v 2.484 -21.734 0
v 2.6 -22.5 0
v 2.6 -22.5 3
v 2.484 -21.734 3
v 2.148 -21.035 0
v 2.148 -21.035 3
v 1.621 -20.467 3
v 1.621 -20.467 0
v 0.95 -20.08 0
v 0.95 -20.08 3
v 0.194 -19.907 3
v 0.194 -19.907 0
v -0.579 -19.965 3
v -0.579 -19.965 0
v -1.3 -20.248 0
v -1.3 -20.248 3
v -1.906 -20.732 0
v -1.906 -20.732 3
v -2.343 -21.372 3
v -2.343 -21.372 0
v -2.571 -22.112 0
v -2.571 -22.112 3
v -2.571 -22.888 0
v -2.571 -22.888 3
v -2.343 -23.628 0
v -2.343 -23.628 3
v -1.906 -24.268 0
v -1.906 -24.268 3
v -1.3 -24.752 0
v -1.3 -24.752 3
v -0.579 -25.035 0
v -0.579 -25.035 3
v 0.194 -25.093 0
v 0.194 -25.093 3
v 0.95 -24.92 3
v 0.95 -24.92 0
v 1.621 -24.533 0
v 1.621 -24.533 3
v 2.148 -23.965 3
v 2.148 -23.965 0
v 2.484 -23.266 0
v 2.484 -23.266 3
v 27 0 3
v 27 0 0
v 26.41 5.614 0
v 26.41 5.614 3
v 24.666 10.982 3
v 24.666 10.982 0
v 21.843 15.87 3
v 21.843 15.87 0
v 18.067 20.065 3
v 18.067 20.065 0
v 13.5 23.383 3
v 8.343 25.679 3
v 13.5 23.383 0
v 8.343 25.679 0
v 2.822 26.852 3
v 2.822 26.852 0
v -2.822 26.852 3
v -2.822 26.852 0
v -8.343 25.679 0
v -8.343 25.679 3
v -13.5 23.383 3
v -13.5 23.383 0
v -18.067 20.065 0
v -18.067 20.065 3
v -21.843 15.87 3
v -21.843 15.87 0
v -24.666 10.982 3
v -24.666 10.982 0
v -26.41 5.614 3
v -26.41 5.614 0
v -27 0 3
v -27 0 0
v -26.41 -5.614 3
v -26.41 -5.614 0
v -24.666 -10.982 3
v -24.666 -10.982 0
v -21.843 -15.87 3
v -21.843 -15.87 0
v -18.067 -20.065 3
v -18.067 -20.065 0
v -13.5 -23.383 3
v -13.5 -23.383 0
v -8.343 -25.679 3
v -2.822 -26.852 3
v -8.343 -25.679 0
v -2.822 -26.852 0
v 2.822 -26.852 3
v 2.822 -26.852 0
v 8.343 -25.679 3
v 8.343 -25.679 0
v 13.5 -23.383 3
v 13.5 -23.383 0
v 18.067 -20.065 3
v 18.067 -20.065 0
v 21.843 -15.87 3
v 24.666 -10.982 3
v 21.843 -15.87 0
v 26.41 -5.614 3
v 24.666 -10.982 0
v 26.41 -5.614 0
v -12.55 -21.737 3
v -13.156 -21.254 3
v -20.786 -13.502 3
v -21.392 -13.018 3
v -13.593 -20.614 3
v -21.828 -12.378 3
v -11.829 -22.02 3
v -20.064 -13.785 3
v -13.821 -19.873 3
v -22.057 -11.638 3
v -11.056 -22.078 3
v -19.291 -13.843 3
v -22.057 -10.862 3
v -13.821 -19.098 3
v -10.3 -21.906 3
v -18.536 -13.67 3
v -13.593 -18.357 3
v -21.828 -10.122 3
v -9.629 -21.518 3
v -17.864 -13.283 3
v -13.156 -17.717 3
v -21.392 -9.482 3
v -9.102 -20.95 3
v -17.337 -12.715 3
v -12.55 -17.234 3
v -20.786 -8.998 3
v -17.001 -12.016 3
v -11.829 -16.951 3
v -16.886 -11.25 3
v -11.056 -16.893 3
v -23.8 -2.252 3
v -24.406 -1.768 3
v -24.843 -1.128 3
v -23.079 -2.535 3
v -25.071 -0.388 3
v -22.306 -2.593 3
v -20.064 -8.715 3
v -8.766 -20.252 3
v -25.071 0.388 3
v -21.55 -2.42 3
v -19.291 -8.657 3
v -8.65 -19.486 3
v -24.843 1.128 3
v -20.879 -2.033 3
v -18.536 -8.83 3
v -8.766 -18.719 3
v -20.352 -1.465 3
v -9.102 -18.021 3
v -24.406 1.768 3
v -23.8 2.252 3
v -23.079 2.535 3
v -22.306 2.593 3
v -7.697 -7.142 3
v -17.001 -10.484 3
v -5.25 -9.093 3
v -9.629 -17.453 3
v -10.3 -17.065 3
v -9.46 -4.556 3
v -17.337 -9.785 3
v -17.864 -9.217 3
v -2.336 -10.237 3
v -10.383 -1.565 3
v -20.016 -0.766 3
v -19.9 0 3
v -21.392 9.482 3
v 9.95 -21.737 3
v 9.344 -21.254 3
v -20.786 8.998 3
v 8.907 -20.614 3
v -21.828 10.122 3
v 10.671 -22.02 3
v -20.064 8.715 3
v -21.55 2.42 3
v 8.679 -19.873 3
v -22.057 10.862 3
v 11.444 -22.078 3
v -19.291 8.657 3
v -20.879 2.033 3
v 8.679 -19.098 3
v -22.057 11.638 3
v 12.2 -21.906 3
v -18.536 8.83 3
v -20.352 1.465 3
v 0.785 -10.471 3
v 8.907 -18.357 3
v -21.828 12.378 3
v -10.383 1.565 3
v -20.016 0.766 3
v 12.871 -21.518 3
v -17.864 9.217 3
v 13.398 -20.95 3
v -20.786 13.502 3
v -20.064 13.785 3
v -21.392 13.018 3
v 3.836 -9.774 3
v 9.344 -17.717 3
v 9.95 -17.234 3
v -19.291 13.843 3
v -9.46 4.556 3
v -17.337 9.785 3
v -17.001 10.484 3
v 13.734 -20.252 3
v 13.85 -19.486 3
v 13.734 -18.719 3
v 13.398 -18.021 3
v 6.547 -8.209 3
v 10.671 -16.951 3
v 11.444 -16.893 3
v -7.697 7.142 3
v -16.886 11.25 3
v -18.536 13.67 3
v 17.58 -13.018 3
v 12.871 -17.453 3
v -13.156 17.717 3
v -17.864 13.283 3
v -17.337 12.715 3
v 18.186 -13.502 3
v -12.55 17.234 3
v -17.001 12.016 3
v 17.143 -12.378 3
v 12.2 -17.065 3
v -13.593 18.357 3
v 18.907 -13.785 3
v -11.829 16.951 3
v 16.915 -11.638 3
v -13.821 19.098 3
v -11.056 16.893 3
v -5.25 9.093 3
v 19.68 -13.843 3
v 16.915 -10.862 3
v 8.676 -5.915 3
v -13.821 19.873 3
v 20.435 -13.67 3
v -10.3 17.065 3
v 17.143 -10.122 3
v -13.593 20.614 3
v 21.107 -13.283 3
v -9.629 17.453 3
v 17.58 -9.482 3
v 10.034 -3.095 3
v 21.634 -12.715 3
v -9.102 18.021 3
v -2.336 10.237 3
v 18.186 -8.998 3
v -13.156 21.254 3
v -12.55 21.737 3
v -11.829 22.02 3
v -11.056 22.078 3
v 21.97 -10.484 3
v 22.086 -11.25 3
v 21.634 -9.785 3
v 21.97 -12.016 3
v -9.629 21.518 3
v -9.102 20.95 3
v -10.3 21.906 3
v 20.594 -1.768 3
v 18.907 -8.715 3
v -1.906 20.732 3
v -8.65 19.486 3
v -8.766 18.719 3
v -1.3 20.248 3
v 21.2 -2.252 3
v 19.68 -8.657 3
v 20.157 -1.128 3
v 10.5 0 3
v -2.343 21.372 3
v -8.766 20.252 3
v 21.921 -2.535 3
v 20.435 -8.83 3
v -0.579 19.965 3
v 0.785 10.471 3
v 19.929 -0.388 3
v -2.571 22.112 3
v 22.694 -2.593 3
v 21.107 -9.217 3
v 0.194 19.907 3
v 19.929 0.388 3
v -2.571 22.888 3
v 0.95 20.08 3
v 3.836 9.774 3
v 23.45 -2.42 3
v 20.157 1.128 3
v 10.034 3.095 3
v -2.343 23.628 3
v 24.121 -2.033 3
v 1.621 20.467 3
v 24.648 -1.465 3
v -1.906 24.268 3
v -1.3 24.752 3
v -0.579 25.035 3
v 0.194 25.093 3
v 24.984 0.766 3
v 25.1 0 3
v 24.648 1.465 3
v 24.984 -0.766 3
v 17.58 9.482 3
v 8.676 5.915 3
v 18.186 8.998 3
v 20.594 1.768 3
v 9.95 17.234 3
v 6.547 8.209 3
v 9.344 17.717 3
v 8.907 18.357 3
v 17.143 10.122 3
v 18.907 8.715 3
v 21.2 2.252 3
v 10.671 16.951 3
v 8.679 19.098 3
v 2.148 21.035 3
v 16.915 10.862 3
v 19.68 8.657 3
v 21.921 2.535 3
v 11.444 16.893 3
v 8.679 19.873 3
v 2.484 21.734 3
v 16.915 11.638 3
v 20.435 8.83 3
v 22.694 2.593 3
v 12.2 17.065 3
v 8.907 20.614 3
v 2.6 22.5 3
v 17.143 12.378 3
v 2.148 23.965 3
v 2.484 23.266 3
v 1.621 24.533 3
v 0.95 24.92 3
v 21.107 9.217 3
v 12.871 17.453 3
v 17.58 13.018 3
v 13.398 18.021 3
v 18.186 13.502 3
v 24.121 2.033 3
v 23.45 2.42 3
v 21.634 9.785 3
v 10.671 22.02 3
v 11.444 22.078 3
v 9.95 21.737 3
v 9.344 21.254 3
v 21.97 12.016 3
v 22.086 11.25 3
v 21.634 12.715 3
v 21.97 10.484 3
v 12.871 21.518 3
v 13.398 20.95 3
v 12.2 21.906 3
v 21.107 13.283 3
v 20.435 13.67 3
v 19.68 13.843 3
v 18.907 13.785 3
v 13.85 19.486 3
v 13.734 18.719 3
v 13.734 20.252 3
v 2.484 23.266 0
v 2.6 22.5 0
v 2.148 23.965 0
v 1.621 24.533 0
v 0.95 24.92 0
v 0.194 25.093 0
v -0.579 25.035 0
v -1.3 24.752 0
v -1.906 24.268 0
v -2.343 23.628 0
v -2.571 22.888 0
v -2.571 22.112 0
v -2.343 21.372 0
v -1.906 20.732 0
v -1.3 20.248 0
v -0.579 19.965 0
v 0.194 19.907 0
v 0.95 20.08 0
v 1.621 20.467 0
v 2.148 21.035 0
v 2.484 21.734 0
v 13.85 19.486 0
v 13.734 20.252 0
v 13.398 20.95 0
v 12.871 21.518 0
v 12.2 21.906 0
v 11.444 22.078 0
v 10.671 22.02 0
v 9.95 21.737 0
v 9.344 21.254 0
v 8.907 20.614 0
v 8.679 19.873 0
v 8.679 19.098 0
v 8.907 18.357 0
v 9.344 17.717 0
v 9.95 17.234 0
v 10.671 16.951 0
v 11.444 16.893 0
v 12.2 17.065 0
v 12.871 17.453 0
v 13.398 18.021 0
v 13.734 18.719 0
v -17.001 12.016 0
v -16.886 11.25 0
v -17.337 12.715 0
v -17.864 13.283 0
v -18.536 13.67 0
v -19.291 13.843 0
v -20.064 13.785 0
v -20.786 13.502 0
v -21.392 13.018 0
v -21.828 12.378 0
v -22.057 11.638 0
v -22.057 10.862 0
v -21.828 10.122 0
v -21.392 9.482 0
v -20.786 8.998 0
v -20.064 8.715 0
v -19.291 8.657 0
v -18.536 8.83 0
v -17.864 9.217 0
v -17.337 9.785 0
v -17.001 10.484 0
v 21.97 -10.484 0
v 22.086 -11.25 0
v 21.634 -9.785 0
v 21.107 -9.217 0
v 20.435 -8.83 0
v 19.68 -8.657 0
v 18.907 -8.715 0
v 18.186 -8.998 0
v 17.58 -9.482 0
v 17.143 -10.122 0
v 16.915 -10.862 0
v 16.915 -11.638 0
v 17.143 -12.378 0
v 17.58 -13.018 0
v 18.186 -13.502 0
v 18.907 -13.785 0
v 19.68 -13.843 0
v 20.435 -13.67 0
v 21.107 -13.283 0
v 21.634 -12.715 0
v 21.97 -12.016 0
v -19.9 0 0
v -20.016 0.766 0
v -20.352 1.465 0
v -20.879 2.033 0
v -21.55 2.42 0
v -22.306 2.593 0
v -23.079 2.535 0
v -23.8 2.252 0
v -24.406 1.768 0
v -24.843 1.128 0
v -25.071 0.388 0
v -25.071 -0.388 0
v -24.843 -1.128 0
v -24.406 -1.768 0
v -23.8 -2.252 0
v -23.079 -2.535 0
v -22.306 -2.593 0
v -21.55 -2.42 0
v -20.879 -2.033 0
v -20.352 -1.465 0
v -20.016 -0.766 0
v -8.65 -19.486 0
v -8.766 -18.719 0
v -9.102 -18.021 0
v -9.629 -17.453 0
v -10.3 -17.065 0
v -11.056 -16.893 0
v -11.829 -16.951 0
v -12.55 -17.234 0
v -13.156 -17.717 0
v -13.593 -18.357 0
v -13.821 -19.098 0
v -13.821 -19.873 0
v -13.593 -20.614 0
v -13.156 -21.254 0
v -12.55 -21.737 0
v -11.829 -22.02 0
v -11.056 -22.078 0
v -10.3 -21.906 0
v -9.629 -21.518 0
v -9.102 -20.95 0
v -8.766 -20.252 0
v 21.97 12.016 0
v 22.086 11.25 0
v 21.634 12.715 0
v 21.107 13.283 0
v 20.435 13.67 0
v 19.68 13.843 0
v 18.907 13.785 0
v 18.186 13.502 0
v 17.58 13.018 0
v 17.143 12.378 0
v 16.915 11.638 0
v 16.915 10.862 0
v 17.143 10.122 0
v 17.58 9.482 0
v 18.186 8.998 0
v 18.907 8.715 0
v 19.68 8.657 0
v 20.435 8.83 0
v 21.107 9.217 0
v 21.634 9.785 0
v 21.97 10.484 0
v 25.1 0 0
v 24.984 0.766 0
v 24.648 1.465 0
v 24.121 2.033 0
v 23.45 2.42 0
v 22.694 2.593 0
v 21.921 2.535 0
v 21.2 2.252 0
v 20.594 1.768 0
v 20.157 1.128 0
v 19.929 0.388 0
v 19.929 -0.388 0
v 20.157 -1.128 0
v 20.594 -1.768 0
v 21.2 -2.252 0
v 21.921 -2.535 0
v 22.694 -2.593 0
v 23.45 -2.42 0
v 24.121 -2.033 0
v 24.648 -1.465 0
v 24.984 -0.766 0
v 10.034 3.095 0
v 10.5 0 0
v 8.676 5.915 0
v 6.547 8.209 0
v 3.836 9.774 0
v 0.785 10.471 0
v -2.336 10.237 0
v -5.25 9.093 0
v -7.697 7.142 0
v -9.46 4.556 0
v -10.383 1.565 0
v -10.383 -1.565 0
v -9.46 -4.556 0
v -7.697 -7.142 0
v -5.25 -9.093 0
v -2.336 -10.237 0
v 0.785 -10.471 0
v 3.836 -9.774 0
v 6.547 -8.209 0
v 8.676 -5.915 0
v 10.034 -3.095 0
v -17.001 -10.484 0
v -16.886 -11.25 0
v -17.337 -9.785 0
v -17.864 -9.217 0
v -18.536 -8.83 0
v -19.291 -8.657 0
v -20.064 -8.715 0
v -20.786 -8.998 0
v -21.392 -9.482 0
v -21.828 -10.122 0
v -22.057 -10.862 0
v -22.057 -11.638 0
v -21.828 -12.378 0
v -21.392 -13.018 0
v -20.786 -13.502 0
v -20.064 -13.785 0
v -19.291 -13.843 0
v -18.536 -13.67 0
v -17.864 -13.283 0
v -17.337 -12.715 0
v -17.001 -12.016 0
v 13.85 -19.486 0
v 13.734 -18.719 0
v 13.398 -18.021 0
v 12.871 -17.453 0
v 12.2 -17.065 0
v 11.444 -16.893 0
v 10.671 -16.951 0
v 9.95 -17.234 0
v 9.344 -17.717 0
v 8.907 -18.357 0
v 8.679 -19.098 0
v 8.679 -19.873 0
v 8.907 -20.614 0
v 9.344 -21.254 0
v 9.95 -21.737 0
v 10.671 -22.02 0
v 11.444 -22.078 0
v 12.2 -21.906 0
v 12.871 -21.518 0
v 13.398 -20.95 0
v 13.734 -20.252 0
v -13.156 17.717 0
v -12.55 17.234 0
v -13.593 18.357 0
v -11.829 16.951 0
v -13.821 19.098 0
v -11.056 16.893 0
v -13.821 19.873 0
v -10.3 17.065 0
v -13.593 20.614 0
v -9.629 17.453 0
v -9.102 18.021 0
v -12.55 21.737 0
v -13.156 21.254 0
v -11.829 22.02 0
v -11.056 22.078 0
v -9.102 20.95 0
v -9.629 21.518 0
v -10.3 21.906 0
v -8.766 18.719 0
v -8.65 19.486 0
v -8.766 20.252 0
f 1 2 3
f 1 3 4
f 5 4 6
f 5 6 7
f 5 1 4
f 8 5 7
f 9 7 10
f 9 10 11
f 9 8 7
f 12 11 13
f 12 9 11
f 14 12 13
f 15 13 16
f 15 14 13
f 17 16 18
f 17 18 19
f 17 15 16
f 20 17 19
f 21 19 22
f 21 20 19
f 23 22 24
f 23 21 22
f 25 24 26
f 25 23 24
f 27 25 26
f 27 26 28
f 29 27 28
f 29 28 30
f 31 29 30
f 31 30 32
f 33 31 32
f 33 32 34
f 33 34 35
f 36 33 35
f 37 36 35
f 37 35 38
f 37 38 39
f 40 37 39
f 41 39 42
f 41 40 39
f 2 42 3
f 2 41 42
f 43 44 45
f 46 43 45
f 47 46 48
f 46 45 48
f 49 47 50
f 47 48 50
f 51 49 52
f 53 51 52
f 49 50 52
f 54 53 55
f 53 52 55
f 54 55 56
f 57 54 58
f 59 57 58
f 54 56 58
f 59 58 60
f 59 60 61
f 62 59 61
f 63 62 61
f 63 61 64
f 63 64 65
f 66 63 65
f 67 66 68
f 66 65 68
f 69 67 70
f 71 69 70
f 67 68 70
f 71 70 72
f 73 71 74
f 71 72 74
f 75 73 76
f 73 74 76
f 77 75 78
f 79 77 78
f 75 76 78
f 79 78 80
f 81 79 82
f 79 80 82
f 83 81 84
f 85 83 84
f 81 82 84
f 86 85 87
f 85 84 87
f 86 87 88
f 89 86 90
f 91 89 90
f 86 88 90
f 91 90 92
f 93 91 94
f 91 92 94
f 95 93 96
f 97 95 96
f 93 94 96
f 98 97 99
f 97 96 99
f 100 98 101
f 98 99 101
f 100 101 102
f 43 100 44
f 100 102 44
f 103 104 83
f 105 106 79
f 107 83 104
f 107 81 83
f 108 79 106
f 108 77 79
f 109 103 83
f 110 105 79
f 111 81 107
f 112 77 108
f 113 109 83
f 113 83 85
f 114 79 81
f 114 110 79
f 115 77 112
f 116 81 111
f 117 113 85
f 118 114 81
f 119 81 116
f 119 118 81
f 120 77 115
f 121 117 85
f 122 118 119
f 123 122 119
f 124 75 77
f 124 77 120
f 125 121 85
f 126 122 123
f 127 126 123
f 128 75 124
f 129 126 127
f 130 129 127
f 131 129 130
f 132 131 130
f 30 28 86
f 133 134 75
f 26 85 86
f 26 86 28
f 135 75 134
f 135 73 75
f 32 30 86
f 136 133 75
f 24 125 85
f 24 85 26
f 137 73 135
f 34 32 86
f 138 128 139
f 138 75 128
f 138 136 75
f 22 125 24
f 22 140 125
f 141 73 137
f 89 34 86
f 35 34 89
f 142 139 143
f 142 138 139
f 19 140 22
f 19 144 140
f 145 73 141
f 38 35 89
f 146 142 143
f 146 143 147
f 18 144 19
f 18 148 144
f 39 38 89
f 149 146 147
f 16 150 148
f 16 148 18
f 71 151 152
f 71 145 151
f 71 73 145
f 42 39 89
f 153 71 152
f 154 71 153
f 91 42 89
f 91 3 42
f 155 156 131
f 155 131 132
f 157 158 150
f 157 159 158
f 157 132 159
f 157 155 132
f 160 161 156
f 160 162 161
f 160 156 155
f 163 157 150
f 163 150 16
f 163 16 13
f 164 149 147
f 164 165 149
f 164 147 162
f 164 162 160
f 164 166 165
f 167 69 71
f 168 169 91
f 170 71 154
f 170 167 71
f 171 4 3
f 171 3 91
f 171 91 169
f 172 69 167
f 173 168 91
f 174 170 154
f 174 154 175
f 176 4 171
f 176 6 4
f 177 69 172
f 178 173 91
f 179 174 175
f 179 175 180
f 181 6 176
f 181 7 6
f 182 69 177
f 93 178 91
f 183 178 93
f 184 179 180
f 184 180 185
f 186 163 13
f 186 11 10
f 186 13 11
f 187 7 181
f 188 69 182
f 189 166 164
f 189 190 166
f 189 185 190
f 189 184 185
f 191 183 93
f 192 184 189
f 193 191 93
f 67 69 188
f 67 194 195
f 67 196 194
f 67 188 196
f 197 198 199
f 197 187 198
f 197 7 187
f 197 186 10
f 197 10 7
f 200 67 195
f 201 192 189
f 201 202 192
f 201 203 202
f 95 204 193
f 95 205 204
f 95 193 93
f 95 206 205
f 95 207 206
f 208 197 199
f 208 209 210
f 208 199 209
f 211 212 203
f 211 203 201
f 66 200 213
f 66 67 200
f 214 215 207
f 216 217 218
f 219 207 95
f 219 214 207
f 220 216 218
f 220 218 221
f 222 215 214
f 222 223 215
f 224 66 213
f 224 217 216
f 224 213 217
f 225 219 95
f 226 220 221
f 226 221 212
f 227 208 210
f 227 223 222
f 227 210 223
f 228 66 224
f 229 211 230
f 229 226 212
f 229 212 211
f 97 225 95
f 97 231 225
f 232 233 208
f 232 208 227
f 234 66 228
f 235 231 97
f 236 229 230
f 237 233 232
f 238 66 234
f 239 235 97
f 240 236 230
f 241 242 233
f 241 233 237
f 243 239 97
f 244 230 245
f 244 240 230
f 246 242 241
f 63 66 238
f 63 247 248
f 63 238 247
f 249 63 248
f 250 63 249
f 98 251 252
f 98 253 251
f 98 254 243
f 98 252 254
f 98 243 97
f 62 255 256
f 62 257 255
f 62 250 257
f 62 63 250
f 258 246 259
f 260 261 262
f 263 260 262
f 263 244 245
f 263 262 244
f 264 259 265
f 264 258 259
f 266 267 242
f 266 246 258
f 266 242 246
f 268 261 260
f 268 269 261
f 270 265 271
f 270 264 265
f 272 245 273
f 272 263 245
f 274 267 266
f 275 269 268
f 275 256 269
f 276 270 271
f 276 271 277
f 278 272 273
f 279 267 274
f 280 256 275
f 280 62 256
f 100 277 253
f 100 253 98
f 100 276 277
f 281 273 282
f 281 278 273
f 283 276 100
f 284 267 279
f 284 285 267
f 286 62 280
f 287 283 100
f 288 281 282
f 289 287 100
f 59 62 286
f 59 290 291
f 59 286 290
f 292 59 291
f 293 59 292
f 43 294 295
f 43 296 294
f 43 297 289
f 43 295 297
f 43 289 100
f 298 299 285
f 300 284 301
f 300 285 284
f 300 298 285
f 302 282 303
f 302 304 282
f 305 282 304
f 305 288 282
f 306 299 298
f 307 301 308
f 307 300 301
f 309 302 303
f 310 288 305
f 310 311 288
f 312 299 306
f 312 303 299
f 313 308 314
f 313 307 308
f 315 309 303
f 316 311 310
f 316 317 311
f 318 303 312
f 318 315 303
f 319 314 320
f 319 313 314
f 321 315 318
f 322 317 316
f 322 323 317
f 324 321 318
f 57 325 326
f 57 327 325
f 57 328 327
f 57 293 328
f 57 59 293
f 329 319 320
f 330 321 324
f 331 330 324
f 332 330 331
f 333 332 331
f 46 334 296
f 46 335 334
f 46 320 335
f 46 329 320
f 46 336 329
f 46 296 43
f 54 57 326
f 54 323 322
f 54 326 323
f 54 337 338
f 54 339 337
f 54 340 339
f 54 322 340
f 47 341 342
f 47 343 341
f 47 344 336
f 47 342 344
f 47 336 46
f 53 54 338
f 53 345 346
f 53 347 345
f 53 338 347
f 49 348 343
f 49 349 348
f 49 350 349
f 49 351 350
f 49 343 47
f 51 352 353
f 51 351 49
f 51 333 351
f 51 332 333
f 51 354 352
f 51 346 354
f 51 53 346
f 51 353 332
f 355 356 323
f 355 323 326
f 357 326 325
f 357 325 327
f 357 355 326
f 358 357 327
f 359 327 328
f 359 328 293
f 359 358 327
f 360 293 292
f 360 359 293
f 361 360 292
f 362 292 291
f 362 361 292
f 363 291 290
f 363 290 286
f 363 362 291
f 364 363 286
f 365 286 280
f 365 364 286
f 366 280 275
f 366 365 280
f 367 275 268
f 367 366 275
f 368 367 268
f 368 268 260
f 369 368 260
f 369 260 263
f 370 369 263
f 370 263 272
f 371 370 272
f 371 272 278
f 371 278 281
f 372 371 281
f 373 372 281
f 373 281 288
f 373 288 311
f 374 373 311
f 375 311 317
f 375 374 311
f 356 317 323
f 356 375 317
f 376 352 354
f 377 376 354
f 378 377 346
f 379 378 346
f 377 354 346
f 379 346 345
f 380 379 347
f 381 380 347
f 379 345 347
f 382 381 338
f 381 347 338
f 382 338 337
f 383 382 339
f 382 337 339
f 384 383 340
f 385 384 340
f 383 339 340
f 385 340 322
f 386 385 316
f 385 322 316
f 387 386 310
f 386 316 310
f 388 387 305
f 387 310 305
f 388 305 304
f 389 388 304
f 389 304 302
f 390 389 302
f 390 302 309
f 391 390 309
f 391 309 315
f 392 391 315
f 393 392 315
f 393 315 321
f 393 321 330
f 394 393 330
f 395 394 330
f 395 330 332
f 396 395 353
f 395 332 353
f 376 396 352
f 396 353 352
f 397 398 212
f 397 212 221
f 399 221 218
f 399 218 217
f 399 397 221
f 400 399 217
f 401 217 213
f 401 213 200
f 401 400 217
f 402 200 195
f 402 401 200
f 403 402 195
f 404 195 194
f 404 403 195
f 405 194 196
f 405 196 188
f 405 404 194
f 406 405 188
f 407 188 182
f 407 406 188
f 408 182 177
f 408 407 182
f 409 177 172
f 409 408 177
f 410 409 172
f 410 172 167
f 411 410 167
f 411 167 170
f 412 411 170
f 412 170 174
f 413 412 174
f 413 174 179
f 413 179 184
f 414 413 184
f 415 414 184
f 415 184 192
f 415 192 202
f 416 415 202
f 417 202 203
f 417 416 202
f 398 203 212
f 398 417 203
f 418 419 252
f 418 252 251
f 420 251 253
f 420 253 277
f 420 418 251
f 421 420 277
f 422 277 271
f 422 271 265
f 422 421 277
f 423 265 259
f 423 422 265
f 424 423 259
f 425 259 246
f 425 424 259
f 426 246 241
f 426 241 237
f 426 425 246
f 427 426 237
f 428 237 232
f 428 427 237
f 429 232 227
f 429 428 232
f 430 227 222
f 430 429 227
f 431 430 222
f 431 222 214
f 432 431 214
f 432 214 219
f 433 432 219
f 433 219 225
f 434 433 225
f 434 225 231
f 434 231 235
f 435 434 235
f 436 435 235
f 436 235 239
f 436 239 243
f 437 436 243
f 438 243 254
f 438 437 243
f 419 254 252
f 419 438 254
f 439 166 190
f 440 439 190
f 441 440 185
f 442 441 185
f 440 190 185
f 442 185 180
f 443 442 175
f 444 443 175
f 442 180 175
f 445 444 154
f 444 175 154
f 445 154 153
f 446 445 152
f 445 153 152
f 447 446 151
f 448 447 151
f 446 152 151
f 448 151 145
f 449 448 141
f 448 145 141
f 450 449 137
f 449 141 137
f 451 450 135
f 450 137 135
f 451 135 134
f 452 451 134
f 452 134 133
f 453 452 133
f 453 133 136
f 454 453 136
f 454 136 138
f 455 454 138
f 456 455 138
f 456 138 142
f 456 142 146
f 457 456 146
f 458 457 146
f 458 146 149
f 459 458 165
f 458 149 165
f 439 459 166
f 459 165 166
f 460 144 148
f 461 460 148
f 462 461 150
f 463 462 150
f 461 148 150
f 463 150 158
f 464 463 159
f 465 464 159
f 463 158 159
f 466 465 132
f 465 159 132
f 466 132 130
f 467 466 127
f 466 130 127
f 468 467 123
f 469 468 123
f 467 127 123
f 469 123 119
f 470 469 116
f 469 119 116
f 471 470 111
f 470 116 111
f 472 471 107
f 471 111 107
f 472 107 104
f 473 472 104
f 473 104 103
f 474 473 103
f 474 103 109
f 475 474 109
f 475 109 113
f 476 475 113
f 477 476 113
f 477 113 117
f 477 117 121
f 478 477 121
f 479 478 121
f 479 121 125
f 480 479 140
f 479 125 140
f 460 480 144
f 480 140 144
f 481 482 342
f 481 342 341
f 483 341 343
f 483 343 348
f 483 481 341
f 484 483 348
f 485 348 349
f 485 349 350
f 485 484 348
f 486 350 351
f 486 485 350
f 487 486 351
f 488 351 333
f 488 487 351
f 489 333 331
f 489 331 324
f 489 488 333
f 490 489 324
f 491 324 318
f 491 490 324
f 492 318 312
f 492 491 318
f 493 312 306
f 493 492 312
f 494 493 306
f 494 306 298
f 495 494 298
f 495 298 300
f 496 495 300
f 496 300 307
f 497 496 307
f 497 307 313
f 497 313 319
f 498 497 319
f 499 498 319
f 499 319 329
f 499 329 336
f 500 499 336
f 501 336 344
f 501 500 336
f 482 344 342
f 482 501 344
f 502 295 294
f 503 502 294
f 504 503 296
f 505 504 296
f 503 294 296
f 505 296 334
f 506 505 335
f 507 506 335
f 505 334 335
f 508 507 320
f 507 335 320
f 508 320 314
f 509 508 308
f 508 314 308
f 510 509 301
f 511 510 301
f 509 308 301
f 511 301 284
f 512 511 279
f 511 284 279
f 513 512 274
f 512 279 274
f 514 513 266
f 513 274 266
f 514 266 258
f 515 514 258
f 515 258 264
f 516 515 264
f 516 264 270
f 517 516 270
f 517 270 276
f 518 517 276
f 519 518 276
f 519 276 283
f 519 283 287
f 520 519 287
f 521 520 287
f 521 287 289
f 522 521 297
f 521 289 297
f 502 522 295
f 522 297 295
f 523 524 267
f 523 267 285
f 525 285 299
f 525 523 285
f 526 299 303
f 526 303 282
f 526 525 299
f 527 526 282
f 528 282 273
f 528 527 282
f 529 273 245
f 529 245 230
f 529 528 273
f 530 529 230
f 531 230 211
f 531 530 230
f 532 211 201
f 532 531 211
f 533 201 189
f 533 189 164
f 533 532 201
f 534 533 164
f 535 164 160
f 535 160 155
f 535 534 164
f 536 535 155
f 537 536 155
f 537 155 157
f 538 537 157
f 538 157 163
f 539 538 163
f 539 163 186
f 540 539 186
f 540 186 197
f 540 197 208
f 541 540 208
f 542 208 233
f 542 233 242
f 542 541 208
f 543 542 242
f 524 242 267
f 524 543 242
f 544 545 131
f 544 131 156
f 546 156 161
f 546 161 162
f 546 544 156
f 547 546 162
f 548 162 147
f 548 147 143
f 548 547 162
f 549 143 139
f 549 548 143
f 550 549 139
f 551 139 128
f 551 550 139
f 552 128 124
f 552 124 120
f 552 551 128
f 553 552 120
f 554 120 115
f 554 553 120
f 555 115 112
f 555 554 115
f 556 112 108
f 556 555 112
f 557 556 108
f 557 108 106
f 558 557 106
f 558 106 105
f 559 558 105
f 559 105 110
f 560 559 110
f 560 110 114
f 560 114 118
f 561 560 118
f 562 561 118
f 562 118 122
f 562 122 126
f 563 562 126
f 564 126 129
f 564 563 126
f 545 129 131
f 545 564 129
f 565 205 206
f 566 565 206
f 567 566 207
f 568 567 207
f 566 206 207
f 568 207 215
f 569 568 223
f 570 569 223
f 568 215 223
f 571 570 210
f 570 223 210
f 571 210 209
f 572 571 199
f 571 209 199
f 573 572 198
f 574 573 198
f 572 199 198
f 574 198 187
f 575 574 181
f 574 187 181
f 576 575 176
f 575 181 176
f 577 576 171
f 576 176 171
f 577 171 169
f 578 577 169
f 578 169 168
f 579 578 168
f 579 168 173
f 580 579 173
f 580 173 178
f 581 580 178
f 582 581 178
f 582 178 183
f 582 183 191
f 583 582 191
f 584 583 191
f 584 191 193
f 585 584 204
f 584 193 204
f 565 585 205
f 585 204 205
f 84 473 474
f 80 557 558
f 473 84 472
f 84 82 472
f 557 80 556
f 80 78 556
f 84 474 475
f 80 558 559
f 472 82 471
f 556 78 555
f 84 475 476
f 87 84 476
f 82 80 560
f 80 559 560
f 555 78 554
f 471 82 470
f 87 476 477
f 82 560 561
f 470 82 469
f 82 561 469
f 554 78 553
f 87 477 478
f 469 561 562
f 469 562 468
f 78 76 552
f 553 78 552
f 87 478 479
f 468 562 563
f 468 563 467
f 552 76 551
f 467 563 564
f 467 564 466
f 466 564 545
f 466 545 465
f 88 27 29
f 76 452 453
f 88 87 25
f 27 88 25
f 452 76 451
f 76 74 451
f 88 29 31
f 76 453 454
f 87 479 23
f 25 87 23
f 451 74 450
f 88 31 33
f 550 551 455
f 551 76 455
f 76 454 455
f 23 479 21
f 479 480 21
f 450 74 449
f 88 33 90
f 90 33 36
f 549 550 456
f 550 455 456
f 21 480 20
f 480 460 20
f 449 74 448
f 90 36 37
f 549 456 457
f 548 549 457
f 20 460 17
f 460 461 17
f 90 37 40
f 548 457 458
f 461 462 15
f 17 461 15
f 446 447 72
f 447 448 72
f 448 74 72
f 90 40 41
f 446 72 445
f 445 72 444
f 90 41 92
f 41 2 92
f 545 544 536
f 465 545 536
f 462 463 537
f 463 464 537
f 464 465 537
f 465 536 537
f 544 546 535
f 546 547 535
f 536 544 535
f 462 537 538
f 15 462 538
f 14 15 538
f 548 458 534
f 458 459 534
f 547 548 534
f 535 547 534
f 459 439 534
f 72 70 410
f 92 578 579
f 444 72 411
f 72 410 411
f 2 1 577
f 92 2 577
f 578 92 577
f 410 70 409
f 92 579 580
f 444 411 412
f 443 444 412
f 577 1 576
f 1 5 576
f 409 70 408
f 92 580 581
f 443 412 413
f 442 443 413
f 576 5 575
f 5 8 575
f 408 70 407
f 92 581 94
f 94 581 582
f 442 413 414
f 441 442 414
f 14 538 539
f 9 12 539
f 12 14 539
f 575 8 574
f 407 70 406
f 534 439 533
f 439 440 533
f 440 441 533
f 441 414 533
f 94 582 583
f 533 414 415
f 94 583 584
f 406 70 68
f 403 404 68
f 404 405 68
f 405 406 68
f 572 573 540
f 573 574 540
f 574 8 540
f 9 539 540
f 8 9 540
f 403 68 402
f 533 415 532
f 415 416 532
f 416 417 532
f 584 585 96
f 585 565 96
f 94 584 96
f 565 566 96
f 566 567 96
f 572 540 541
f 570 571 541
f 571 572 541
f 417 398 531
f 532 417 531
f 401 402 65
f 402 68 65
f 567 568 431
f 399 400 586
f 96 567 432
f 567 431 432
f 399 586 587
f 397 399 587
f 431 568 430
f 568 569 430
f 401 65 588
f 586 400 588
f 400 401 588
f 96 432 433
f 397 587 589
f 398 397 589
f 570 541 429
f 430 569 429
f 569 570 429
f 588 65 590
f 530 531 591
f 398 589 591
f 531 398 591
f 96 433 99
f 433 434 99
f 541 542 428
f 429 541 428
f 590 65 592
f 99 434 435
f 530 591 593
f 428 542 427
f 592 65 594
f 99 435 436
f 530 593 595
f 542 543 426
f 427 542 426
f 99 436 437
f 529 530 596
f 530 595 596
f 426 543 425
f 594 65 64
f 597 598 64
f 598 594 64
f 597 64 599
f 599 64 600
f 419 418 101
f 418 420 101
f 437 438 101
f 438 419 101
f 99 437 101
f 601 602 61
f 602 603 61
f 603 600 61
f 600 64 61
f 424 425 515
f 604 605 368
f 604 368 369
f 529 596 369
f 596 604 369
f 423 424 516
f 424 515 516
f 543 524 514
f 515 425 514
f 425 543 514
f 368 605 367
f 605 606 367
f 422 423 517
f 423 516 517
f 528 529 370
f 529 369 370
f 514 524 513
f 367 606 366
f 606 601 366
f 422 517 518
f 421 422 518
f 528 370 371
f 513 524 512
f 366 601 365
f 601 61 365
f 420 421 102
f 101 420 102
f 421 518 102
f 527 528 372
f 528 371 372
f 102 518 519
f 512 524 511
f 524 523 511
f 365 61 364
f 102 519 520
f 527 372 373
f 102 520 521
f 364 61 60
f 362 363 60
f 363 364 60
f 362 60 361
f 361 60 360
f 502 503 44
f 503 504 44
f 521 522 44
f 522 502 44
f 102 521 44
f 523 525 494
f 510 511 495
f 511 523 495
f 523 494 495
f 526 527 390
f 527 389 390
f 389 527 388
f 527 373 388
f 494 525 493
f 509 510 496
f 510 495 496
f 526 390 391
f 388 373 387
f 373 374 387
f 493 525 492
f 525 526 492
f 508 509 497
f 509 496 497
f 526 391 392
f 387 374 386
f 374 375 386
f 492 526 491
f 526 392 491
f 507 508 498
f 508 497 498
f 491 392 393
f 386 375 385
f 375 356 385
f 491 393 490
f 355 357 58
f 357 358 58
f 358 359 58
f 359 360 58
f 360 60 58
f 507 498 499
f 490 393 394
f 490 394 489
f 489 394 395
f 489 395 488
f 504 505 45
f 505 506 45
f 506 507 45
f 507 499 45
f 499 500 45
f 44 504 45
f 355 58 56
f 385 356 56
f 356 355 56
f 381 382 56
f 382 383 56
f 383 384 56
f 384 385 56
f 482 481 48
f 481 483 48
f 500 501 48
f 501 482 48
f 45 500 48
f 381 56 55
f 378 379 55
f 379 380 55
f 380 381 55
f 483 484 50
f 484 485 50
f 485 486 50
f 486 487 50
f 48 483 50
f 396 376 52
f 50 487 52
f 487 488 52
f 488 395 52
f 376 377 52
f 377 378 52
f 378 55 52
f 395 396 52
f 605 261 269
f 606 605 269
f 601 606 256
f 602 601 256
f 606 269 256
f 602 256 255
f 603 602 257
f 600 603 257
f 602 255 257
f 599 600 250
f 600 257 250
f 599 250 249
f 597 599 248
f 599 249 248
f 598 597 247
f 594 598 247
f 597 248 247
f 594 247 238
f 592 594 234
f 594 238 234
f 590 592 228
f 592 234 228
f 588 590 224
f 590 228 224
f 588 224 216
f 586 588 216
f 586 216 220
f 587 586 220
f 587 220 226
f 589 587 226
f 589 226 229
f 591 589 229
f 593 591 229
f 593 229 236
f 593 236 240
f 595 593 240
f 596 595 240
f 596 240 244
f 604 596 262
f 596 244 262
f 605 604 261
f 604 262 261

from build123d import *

# Parameters (mm, degrees)
SKETCH_1_R          = 27
SKETCH_1_R_2        = 10.5
SKETCH_1_R_3        = 2.6
EXTRUDE_1_DEPTH     = 3
SKETCH_3_R          = 2.6
CUT_EXTRUDE_2_DEPTH = 3


with BuildPart() as part:
    # 草图1 → 凸台-拉伸1 (new body)
    with BuildSketch(Plane.XY):
        Circle(SKETCH_1_R)
        Circle(SKETCH_1_R_2, mode=Mode.SUBTRACT)
        with Locations((0, 22.5)):
            Circle(SKETCH_1_R_3, mode=Mode.SUBTRACT)
        with Locations((19.485571585, 11.25)):
            Circle(SKETCH_1_R_3, mode=Mode.SUBTRACT)
        with Locations((19.485571585, -11.25)):
            Circle(SKETCH_1_R_3, mode=Mode.SUBTRACT)
        with Locations((0, -22.5)):
            Circle(SKETCH_1_R_3, mode=Mode.SUBTRACT)
        with Locations((-19.485571585, -11.25)):
            Circle(SKETCH_1_R_3, mode=Mode.SUBTRACT)
        with Locations((-19.485571585, 11.25)):
            Circle(SKETCH_1_R_3, mode=Mode.SUBTRACT)
    extrude(amount=EXTRUDE_1_DEPTH)

    # 草图3 → 切除-拉伸2 (cut)
    with BuildSketch(Plane.XY.offset(3)):
        with Locations((11.25, 19.485571585)):
            Circle(SKETCH_3_R)
        with Locations((22.5, 0)):
            Circle(SKETCH_3_R)
        with Locations((11.25, -19.485571585)):
            Circle(SKETCH_3_R)
        with Locations((-11.25, -19.485571585)):
            Circle(SKETCH_3_R)
        with Locations((-22.5, 0)):
            Circle(SKETCH_3_R)
        with Locations((-11.25, 19.485571585)):
            Circle(SKETCH_3_R)
    extrude(amount=-CUT_EXTRUDE_2_DEPTH, mode=Mode.SUBTRACT)


solid = part.part
